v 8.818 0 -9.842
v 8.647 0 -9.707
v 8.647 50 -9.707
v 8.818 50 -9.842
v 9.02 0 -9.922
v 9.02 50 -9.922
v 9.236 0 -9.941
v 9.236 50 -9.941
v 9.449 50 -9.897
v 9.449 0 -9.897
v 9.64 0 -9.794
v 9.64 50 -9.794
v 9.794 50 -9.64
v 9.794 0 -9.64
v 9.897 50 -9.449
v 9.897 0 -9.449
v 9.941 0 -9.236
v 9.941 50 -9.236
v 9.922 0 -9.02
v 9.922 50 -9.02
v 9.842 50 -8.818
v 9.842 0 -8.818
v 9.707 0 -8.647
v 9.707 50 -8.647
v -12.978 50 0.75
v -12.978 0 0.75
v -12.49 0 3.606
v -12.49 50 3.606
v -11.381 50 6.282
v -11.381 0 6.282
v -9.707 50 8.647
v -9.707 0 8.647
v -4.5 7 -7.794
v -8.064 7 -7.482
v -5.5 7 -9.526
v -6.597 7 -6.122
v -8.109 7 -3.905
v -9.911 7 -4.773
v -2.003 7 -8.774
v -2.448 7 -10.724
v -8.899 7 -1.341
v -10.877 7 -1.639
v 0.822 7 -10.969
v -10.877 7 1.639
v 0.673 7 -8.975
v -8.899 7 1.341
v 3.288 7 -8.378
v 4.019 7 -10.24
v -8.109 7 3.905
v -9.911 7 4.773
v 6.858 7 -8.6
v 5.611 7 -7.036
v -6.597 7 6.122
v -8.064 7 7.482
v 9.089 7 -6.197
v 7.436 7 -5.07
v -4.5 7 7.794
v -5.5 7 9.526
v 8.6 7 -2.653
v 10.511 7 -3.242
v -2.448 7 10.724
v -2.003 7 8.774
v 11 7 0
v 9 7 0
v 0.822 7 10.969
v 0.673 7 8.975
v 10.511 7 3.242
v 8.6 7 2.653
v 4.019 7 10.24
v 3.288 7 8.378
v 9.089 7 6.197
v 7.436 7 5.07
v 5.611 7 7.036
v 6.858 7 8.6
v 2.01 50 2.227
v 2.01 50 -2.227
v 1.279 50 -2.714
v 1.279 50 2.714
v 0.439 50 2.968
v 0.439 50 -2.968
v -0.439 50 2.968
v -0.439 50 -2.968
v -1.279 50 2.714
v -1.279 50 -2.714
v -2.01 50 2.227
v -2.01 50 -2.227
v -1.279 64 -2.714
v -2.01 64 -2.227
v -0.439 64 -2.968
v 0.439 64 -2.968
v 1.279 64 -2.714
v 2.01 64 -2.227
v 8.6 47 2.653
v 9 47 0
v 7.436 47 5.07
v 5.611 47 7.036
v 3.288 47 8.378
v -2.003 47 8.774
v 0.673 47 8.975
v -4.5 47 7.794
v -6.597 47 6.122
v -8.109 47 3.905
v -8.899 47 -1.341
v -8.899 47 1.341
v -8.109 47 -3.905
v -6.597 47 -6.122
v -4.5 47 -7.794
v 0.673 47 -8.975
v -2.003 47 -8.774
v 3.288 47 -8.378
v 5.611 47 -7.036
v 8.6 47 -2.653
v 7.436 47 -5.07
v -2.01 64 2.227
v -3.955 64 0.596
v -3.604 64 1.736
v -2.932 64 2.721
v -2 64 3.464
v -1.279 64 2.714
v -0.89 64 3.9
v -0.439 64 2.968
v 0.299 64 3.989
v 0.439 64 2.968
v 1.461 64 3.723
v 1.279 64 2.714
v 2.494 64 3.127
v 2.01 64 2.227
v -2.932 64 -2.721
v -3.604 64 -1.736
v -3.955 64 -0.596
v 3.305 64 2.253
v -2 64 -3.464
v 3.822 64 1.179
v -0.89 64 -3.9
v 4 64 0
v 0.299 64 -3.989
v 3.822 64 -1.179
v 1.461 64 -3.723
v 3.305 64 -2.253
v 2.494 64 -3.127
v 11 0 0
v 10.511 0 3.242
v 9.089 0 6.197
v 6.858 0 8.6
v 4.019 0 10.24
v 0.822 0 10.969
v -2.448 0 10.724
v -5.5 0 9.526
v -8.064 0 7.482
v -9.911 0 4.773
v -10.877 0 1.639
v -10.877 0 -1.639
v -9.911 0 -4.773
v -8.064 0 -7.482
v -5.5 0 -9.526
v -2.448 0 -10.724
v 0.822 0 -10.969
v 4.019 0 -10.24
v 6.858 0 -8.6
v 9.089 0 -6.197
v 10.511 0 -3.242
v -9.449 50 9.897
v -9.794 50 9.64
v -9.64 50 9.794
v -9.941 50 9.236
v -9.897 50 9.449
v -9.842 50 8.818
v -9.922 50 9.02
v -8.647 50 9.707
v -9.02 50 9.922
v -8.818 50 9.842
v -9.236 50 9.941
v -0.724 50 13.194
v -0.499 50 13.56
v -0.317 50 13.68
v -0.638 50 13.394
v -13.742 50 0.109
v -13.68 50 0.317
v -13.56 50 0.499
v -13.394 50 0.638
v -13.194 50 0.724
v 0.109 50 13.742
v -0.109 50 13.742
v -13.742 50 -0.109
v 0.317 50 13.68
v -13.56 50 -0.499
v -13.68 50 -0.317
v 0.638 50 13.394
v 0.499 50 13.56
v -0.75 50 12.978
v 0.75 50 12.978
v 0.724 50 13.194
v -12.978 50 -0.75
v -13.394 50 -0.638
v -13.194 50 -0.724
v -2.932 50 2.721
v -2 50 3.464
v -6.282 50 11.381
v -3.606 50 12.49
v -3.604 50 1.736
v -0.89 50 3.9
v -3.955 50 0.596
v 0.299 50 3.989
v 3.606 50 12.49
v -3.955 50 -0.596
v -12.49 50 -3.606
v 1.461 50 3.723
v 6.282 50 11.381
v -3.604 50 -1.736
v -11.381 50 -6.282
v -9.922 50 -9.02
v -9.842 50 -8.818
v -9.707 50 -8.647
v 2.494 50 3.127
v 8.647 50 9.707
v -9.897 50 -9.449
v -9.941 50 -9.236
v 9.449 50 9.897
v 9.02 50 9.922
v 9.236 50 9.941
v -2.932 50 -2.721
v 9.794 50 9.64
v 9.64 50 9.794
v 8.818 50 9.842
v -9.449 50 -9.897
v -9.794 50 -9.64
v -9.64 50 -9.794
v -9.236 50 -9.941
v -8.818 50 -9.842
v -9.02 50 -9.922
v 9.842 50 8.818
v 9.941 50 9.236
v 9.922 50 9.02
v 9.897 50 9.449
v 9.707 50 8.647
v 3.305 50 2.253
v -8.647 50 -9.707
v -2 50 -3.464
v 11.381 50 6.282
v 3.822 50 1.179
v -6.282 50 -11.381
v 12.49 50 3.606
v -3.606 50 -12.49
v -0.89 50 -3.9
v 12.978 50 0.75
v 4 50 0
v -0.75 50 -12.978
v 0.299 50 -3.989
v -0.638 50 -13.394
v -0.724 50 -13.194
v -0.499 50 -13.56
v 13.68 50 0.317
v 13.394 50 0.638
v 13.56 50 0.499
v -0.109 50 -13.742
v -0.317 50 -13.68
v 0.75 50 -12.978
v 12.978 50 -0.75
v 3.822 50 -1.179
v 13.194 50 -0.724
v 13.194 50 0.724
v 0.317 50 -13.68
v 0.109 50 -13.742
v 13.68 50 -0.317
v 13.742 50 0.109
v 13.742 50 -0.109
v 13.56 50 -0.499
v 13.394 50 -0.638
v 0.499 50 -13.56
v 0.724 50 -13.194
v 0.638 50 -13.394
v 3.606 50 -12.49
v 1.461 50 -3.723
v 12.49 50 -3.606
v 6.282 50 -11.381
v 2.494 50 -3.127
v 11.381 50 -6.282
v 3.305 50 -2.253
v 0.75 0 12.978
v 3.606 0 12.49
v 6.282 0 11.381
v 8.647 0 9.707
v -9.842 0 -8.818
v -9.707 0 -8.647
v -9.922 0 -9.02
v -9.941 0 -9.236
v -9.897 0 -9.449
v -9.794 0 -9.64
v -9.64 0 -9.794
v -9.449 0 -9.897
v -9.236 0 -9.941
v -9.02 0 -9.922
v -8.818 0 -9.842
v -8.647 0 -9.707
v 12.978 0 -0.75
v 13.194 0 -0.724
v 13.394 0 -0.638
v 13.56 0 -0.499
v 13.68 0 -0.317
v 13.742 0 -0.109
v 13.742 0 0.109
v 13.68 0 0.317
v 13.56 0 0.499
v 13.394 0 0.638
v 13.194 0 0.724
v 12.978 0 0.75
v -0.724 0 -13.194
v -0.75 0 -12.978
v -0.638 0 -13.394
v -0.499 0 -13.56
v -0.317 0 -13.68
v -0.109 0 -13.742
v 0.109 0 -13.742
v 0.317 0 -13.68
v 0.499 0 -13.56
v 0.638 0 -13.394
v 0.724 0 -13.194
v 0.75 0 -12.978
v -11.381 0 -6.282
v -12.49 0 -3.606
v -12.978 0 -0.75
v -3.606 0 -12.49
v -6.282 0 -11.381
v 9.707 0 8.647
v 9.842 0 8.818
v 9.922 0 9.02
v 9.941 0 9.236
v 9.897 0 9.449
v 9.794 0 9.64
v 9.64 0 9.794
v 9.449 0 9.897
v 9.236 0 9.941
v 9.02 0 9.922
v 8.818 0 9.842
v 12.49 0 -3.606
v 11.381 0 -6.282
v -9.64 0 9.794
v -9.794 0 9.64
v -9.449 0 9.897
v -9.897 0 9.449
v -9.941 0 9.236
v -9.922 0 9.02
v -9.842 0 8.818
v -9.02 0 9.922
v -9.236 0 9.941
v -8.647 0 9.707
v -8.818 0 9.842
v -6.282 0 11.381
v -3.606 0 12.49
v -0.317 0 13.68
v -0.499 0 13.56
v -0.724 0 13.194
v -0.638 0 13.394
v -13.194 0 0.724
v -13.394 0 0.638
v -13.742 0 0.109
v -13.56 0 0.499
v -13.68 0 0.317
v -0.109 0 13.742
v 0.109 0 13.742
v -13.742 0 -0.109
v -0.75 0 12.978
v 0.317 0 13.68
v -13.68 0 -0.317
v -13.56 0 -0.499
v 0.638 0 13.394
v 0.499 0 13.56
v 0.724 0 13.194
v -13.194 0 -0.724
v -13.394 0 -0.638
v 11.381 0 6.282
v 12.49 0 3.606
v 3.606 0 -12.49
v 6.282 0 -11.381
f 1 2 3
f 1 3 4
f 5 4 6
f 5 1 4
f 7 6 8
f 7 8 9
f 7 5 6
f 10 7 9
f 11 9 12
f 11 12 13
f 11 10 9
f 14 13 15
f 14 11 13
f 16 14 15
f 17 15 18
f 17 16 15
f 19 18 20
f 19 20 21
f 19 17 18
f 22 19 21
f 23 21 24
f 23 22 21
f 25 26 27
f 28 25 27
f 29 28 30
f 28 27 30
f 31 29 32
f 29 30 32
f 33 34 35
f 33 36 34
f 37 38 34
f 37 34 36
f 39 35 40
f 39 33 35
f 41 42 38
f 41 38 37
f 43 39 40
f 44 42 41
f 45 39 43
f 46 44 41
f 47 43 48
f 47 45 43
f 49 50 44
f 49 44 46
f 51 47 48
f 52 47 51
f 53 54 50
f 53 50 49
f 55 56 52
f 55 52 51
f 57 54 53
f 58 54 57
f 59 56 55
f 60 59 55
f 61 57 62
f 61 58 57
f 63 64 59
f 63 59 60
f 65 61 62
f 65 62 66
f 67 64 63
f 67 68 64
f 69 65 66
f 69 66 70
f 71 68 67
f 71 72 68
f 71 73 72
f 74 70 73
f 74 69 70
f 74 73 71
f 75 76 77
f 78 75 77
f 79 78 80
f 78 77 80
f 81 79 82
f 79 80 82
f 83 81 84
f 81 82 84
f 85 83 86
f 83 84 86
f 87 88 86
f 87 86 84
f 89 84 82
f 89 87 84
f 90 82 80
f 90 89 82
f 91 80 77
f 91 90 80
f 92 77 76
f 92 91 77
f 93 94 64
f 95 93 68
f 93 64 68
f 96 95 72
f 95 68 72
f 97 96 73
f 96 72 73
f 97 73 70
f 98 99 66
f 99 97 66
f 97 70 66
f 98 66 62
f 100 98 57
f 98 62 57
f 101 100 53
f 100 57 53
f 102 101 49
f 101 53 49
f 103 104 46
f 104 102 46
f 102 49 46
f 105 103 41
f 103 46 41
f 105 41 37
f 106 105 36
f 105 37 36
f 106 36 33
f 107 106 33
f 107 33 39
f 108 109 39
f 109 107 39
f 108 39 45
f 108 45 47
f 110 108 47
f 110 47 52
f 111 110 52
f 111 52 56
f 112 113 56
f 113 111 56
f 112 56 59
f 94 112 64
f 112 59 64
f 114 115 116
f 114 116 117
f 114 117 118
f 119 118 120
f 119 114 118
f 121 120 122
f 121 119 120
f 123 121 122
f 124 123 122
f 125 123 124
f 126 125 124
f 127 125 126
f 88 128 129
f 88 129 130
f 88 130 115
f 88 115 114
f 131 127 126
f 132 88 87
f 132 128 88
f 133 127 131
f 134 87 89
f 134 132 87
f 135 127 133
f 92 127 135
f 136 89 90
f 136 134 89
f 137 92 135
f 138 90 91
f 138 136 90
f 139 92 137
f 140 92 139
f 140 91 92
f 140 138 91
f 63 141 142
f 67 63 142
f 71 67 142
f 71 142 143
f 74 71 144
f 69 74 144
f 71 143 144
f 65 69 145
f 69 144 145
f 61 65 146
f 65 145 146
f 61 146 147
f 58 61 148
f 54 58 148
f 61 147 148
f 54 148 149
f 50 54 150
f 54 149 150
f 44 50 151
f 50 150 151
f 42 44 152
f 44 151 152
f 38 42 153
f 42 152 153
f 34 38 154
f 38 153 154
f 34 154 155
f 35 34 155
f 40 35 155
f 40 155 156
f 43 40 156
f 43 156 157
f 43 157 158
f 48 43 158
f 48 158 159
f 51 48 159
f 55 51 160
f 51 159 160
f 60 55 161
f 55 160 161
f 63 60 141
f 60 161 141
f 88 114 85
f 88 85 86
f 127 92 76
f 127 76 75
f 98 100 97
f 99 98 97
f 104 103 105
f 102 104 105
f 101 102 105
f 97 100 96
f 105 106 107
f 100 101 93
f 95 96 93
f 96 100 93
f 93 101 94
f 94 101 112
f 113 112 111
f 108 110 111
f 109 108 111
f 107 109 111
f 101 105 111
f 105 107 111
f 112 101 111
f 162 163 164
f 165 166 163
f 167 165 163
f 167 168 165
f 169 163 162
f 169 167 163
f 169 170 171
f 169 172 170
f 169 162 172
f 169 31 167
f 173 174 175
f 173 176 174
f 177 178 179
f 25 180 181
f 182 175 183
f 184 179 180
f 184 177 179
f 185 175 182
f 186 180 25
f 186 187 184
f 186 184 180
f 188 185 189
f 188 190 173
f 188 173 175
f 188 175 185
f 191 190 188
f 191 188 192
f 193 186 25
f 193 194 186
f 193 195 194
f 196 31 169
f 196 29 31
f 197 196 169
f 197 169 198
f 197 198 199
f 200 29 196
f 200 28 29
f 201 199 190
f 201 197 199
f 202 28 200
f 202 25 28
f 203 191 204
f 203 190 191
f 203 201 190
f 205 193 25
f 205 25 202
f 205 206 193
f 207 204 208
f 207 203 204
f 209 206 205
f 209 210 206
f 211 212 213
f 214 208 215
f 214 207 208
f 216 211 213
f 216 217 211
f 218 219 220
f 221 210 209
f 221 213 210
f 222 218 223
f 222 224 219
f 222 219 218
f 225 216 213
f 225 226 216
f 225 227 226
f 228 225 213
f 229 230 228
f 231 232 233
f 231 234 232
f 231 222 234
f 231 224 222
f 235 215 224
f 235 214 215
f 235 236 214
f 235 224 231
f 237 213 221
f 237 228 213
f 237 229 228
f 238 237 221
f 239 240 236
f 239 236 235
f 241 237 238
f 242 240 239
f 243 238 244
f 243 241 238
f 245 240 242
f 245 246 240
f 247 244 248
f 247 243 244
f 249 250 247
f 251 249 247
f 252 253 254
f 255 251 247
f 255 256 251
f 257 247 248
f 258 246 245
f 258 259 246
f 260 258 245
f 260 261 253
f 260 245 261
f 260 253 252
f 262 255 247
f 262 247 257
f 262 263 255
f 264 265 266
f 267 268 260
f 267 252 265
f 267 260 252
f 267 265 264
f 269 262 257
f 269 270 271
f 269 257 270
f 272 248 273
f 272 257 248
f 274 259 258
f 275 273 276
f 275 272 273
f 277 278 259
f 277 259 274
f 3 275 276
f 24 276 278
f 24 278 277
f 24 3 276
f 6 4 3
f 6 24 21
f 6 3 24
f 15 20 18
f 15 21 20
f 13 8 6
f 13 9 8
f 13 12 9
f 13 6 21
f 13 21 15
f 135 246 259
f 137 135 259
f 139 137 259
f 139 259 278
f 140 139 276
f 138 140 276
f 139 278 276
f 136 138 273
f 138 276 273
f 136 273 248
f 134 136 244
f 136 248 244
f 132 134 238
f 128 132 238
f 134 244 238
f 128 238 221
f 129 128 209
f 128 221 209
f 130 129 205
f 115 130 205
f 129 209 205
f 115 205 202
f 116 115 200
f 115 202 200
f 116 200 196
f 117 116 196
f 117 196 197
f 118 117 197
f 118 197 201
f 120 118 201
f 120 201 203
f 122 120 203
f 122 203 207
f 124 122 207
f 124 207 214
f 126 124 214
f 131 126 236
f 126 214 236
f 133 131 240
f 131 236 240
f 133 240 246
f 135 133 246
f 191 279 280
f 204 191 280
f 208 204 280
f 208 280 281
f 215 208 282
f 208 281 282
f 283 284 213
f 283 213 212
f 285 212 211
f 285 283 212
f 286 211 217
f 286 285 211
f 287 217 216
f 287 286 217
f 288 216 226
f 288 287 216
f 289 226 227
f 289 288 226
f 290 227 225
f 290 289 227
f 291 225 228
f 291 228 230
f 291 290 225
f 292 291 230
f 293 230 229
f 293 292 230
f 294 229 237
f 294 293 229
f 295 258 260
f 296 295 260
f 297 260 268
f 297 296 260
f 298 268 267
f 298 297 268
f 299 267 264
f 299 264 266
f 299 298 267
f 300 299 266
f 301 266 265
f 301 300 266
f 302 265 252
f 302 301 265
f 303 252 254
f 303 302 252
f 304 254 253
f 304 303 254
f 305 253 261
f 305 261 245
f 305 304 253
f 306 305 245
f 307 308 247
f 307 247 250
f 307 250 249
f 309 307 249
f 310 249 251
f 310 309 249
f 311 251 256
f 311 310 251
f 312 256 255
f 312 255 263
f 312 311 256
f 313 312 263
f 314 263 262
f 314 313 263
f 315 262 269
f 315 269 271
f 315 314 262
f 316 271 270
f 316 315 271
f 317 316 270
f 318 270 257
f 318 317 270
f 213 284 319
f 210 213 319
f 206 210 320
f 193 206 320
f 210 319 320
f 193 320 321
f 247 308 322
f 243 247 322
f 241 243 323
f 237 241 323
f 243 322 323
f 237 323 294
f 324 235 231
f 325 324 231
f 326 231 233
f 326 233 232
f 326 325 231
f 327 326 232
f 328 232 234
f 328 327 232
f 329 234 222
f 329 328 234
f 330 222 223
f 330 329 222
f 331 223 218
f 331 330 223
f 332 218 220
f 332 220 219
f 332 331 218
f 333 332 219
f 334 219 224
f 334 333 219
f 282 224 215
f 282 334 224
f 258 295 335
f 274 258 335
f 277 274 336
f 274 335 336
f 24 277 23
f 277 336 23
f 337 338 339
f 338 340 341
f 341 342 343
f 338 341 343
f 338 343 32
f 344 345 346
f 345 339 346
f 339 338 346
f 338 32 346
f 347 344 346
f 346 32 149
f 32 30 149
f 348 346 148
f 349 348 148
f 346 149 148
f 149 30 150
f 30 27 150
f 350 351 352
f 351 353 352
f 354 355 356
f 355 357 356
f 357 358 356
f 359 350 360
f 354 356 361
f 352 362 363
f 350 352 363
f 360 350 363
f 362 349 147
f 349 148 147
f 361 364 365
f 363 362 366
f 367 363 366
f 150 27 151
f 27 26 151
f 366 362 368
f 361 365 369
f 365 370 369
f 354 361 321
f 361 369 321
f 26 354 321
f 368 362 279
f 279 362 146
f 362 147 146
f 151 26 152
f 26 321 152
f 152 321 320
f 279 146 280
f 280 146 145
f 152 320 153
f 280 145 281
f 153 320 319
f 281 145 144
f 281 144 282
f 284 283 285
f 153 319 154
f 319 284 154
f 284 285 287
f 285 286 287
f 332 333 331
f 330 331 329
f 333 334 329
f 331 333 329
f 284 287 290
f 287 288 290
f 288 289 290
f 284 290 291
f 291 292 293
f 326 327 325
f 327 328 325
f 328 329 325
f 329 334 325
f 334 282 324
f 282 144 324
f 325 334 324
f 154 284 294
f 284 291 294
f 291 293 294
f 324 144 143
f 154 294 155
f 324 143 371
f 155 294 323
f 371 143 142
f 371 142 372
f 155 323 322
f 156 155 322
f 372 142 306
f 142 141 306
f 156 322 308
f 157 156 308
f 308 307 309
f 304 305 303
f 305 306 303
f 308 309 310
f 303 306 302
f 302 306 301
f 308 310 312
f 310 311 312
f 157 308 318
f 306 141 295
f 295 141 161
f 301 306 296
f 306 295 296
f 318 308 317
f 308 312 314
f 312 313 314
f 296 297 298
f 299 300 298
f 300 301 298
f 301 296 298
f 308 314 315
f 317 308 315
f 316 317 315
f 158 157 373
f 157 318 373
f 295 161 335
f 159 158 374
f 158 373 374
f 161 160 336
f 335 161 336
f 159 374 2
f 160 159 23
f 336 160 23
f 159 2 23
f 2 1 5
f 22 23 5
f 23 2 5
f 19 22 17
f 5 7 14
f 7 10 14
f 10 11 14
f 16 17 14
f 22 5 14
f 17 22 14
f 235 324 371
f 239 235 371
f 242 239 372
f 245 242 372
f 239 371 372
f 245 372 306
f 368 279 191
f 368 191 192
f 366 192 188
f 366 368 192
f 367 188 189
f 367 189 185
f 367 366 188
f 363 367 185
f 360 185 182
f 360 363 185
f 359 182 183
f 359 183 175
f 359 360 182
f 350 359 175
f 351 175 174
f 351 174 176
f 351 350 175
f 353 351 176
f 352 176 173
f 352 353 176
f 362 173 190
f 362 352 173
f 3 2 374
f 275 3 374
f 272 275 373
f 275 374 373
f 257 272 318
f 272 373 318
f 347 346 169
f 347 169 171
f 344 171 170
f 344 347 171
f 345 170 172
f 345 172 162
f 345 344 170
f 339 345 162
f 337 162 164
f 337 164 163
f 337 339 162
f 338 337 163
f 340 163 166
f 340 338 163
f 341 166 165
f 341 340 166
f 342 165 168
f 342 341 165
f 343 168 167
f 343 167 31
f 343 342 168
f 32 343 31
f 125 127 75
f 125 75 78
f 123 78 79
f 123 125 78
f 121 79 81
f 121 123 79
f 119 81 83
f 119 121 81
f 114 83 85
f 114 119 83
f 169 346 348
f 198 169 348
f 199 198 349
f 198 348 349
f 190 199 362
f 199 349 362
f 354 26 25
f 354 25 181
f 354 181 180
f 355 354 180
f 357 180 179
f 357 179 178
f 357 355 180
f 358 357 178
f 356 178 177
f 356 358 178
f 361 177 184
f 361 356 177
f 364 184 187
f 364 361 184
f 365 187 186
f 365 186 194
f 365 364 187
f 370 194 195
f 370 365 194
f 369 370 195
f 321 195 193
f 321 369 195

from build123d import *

# Parameters (mm, degrees)
ESQUISSE2_R                  = 13
BOSS_EXTRU_1_DEPTH           = 50
ESQUISSE3_R                  = 9
ENL_V_MAT_EXTRU_1_DEPTH      = 51
ESQUISSE4_R                  = 11
ENL_V_MAT_EXTRU_2_DEPTH      = 7
ESQUISSE6_R                  = 0.75
BOSS_EXTRU_2_DEPTH           = 50
R_P_TITION_CIRCULAIRE1_COUNT = 8
ESQUISSE7_R                  = 9
BOSS_EXTRU_3_DEPTH           = 3
ESQUISSE8_R                  = 4
BOSS_EXTRU_5_DEPTH           = 14
ENL_V_MAT_EXTRU_4_DEPTH      = 14


with BuildPart() as part:
    # Esquisse2 → Boss.-Extru.1 (new body)
    with BuildSketch(Plane(origin=(0, 0, 0), x_dir=(1, 0, 0), z_dir=(0, 1, 0))):
        Circle(ESQUISSE2_R)
    extrude(amount=BOSS_EXTRU_1_DEPTH)

    # Esquisse3 → Enlèv. mat.-Extru.1 (cut, through all)
    with BuildSketch(Plane.XZ):
        Circle(ESQUISSE3_R)
    extrude(amount=-ENL_V_MAT_EXTRU_1_DEPTH, mode=Mode.SUBTRACT)

    # Esquisse4 → Enlèv. mat.-Extru.2 (cut)
    with BuildSketch(Plane.XZ):
        Circle(ESQUISSE4_R)
    extrude(amount=-ENL_V_MAT_EXTRU_2_DEPTH, mode=Mode.SUBTRACT)

    # Esquisse6 → Boss.-Extru.2 (add)
    with BuildSketch(Plane(origin=(0, 0, 0), x_dir=(-1, 0, 0), z_dir=(0, -1, 0))):
        with Locations((-13, 0)):
            Circle(ESQUISSE6_R)
    boss_extru_2 = extrude(amount=-BOSS_EXTRU_2_DEPTH)

    # Répétition circulaire1: Boss.-Extru.2 ×8 about axis
    r_p_tition_circulaire1_axis = Axis((0, 0, 0), (0, 1, 0))
    for i in range(1, R_P_TITION_CIRCULAIRE1_COUNT):
        add(boss_extru_2.rotate(r_p_tition_circulaire1_axis, i * 360 / R_P_TITION_CIRCULAIRE1_COUNT))

    # Esquisse7 → Boss.-Extru.3 (add)
    with BuildSketch(Plane(origin=(0, 50, 0), x_dir=(1, 0, 0), z_dir=(0, 1, 0))):
        Circle(ESQUISSE7_R)
    extrude(amount=-BOSS_EXTRU_3_DEPTH)

    # Esquisse8 → Boss.-Extru.5 (add)
    with BuildSketch(Plane(origin=(0, 50, 0), x_dir=(1, 0, 0), z_dir=(0, 1, 0))):
        Circle(ESQUISSE8_R)
    extrude(amount=BOSS_EXTRU_5_DEPTH)

    # Esquisse10 → Enlèv. mat.-Extru.4 (cut)
    with BuildSketch(Plane(origin=(0, 64, 0), x_dir=(1, 0, 0), z_dir=(0, 1, 0))):
        with BuildLine():
            Line((-2.009853687, -2.227215337), (-2.009853687, 2.227215337))
            ThreePointArc((-2.009853687, 2.227215337), (0, 3), (2.009853687, 2.227215337))
            Line((2.009853687, 2.227215337), (2.009853687, -2.227215337))
            ThreePointArc((2.009853687, -2.227215337), (0, -3), (-2.009853687, -2.227215337))
        make_face()
    extrude(amount=-ENL_V_MAT_EXTRU_4_DEPTH, mode=Mode.SUBTRACT)


solid = part.part
